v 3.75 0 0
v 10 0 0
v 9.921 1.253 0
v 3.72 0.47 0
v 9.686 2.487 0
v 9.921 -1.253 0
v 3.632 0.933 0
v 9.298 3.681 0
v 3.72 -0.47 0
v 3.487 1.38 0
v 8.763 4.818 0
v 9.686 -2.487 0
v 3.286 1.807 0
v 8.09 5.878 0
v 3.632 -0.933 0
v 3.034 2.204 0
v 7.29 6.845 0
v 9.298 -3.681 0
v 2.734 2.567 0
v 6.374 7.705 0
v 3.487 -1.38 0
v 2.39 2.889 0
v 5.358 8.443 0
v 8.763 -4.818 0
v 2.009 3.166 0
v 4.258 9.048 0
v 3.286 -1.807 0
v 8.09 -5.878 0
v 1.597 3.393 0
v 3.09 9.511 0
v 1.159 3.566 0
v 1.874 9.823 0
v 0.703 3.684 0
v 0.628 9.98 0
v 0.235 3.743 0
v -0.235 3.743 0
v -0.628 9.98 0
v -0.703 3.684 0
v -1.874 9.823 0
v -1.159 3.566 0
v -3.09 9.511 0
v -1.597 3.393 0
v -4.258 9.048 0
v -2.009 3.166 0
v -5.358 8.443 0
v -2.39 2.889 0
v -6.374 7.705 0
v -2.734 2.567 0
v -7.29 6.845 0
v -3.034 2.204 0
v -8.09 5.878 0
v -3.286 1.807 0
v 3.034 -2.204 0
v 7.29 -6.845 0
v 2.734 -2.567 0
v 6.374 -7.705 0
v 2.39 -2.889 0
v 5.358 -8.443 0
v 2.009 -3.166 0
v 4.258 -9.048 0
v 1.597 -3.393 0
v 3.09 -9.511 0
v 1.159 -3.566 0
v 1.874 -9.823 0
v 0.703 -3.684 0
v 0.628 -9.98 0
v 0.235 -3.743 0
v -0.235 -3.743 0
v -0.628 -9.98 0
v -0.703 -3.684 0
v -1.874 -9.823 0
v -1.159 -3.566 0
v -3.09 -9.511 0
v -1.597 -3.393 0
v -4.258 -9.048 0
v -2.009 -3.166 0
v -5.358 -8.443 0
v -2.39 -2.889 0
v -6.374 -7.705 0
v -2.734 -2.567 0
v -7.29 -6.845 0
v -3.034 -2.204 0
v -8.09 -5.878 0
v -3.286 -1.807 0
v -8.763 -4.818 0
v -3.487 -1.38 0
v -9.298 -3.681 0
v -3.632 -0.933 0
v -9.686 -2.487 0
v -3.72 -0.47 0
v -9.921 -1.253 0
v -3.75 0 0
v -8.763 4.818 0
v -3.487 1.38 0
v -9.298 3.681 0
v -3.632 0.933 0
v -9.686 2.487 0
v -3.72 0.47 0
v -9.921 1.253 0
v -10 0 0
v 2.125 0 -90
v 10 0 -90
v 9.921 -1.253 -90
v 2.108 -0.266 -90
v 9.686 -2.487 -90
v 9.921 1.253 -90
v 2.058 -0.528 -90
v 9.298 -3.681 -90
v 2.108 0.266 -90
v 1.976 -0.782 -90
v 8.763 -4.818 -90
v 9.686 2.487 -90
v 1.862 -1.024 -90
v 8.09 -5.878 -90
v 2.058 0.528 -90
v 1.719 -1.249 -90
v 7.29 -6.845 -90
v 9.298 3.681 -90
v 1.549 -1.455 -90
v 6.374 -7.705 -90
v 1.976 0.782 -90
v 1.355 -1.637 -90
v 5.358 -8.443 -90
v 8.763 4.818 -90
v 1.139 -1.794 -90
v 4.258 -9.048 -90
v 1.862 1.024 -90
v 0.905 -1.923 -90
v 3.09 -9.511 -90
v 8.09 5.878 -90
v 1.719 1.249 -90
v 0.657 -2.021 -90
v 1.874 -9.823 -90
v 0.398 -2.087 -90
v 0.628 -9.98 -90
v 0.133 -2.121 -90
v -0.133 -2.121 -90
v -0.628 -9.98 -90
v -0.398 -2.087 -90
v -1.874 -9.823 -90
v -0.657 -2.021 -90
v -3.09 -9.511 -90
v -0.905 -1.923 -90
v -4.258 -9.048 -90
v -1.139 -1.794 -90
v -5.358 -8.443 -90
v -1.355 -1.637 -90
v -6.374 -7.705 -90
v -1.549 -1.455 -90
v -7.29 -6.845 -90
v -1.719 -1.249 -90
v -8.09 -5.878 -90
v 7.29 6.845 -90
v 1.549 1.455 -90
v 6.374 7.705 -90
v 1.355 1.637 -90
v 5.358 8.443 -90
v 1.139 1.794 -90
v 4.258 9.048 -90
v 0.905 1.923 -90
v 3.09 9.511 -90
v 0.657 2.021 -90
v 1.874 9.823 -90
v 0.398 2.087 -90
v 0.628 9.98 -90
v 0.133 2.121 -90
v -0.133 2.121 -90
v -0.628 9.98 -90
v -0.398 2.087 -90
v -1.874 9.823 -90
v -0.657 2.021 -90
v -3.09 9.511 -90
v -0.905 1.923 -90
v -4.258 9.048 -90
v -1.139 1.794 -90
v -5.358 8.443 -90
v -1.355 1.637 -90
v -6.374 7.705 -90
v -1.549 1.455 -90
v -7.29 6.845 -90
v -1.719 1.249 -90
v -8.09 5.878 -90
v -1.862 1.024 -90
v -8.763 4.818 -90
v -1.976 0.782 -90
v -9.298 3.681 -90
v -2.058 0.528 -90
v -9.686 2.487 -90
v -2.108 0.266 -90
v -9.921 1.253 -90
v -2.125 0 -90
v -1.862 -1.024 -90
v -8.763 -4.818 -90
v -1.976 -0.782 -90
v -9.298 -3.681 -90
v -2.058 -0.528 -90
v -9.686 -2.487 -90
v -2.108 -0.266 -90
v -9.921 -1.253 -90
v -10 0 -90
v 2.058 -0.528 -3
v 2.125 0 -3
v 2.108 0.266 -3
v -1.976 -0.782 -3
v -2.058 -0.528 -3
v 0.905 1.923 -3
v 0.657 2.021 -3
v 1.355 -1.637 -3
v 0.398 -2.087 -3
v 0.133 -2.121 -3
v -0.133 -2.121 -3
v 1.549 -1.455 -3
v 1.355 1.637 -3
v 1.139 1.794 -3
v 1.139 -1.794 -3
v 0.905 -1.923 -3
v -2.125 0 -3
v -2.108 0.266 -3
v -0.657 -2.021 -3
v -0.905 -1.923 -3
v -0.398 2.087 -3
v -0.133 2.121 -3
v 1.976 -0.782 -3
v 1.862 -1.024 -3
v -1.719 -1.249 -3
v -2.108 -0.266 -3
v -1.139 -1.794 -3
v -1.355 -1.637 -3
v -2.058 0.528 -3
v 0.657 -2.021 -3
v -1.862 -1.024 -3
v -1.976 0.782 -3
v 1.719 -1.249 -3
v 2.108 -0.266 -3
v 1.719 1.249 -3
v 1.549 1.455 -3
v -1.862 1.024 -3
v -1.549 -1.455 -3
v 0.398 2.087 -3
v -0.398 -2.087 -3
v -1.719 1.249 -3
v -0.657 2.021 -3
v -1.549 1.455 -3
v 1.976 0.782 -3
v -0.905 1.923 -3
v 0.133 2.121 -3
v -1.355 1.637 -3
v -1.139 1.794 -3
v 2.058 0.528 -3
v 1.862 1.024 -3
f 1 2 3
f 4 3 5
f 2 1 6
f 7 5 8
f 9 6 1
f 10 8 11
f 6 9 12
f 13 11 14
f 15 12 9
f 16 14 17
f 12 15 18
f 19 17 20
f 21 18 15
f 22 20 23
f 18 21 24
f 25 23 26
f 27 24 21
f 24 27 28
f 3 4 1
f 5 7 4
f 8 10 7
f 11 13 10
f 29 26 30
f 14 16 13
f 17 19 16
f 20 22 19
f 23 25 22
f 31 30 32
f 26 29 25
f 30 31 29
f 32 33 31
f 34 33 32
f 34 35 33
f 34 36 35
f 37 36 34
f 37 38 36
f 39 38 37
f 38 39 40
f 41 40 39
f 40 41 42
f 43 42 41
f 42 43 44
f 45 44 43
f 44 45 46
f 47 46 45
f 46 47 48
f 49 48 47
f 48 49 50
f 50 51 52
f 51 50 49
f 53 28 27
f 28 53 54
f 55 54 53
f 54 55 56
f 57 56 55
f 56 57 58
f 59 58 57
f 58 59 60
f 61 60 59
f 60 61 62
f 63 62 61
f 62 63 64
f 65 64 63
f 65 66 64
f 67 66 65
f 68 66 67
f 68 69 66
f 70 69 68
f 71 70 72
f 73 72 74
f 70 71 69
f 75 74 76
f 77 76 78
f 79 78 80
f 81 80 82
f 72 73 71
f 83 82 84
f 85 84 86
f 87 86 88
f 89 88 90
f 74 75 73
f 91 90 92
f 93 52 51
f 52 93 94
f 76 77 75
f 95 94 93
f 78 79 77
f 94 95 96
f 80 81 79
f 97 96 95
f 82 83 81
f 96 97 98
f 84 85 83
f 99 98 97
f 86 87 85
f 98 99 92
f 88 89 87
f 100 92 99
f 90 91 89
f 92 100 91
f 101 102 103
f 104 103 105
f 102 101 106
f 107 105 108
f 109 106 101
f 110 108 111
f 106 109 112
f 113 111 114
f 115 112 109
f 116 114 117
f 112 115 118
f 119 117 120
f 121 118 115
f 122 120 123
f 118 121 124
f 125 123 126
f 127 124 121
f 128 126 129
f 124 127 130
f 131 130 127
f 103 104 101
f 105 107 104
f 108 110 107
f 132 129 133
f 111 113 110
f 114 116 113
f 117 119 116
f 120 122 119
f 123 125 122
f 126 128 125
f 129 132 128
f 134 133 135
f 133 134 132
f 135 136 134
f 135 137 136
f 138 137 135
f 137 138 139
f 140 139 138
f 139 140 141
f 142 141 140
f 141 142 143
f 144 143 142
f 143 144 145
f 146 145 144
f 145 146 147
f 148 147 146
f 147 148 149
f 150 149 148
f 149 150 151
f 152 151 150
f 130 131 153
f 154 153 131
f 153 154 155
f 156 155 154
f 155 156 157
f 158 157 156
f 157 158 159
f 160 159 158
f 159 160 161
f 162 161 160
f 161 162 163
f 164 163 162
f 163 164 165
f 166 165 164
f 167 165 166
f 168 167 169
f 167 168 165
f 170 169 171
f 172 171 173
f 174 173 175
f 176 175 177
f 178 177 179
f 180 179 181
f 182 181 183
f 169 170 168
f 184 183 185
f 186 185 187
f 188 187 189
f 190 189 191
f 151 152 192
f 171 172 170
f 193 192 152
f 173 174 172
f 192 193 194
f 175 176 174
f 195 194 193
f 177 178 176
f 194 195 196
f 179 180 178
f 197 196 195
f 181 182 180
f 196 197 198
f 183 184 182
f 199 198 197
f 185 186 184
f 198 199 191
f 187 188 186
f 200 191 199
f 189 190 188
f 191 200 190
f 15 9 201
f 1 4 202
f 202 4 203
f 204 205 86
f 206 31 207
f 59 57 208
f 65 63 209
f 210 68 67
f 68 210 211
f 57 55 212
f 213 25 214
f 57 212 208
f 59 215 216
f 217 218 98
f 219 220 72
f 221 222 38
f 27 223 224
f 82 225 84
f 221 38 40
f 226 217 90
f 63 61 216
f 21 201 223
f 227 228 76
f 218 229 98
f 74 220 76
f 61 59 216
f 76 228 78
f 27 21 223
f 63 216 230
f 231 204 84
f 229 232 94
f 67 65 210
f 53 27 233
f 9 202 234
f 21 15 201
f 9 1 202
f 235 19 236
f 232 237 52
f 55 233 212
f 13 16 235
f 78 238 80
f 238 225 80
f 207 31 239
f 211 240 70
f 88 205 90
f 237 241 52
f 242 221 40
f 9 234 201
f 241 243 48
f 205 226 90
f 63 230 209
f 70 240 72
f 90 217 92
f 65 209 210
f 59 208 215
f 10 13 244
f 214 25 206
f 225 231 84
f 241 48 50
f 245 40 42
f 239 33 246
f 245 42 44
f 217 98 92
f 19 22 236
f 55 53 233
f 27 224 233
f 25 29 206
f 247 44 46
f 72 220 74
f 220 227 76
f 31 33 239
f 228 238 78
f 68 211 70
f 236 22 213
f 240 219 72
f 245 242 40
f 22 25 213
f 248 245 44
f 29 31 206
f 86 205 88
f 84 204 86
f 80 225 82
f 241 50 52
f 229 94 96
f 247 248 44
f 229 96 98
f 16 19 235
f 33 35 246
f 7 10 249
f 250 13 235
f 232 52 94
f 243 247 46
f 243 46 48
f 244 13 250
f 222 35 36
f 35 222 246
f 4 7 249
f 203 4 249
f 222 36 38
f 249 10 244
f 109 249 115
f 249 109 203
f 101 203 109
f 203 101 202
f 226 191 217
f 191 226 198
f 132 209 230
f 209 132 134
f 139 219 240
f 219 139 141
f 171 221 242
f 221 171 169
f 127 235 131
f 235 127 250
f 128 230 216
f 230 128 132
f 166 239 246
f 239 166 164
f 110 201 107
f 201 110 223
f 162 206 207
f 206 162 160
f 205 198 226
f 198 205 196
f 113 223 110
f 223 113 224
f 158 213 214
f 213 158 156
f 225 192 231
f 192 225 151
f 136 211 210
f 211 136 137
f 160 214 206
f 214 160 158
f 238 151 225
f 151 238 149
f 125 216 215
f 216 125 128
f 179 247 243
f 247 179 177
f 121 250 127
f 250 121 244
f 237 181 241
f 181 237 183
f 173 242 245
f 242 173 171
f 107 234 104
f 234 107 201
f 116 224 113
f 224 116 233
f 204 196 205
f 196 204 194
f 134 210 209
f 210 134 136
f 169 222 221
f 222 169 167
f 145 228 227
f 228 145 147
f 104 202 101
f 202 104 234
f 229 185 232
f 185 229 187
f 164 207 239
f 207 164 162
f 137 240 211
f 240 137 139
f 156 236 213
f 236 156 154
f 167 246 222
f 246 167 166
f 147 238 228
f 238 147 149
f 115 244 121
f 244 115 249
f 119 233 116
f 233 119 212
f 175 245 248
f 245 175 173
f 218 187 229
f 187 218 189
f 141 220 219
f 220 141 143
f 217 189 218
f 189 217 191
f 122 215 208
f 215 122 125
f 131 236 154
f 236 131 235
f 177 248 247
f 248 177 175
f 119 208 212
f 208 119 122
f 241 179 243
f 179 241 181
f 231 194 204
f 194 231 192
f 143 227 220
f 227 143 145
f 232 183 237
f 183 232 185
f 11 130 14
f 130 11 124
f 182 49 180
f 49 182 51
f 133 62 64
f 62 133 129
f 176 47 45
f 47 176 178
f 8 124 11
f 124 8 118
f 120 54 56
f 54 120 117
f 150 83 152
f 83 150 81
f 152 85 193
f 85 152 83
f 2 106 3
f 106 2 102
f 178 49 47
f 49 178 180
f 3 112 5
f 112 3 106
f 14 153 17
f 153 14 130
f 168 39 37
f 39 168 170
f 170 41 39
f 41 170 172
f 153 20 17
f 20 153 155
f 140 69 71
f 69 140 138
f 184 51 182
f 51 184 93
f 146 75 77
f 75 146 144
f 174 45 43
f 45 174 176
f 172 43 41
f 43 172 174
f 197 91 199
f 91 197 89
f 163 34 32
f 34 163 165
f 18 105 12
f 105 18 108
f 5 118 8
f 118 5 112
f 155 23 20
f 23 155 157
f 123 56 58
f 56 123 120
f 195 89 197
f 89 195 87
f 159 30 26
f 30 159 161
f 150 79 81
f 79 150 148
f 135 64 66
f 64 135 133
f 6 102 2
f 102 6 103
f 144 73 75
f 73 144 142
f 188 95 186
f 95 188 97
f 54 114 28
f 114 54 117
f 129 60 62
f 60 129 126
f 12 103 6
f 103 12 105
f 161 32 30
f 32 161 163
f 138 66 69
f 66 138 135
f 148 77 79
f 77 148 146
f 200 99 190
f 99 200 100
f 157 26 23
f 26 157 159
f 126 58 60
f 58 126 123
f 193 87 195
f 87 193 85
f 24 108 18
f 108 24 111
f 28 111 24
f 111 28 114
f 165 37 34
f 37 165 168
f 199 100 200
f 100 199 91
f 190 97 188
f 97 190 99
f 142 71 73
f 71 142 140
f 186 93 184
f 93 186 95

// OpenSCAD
$fn = 50;


difference() {
	union() {
		translate(v = [0, 0, -90.0000000000]) {
			cylinder(h = 90, r = 10.0000000000);
		}
		cylinder(h = 0, r = 20.0000000000);
	}
	union() {
		translate(v = [0, 0, 0]) {
			rotate(a = [0, 0, 0]) {
				difference() {
					union() {
						#translate(v = [0, 0, -90.0000000000]) {
							cylinder(h = 90, r = 2.0000000000);
						}
						#translate(v = [0, 0, -3]) {
							cylinder(h = 3, r1 = 2.1250000000, r2 = 3.7500000000);
						}
						#translate(v = [0, 0, -90.0000000000]) {
							cylinder(h = 90, r = 2.1250000000);
						}
						#translate(v = [0, 0, -90.0000000000]) {
							cylinder(h = 90, r = 2.0000000000);
						}
					}
					union();
				}
			}
		}
	}
}
